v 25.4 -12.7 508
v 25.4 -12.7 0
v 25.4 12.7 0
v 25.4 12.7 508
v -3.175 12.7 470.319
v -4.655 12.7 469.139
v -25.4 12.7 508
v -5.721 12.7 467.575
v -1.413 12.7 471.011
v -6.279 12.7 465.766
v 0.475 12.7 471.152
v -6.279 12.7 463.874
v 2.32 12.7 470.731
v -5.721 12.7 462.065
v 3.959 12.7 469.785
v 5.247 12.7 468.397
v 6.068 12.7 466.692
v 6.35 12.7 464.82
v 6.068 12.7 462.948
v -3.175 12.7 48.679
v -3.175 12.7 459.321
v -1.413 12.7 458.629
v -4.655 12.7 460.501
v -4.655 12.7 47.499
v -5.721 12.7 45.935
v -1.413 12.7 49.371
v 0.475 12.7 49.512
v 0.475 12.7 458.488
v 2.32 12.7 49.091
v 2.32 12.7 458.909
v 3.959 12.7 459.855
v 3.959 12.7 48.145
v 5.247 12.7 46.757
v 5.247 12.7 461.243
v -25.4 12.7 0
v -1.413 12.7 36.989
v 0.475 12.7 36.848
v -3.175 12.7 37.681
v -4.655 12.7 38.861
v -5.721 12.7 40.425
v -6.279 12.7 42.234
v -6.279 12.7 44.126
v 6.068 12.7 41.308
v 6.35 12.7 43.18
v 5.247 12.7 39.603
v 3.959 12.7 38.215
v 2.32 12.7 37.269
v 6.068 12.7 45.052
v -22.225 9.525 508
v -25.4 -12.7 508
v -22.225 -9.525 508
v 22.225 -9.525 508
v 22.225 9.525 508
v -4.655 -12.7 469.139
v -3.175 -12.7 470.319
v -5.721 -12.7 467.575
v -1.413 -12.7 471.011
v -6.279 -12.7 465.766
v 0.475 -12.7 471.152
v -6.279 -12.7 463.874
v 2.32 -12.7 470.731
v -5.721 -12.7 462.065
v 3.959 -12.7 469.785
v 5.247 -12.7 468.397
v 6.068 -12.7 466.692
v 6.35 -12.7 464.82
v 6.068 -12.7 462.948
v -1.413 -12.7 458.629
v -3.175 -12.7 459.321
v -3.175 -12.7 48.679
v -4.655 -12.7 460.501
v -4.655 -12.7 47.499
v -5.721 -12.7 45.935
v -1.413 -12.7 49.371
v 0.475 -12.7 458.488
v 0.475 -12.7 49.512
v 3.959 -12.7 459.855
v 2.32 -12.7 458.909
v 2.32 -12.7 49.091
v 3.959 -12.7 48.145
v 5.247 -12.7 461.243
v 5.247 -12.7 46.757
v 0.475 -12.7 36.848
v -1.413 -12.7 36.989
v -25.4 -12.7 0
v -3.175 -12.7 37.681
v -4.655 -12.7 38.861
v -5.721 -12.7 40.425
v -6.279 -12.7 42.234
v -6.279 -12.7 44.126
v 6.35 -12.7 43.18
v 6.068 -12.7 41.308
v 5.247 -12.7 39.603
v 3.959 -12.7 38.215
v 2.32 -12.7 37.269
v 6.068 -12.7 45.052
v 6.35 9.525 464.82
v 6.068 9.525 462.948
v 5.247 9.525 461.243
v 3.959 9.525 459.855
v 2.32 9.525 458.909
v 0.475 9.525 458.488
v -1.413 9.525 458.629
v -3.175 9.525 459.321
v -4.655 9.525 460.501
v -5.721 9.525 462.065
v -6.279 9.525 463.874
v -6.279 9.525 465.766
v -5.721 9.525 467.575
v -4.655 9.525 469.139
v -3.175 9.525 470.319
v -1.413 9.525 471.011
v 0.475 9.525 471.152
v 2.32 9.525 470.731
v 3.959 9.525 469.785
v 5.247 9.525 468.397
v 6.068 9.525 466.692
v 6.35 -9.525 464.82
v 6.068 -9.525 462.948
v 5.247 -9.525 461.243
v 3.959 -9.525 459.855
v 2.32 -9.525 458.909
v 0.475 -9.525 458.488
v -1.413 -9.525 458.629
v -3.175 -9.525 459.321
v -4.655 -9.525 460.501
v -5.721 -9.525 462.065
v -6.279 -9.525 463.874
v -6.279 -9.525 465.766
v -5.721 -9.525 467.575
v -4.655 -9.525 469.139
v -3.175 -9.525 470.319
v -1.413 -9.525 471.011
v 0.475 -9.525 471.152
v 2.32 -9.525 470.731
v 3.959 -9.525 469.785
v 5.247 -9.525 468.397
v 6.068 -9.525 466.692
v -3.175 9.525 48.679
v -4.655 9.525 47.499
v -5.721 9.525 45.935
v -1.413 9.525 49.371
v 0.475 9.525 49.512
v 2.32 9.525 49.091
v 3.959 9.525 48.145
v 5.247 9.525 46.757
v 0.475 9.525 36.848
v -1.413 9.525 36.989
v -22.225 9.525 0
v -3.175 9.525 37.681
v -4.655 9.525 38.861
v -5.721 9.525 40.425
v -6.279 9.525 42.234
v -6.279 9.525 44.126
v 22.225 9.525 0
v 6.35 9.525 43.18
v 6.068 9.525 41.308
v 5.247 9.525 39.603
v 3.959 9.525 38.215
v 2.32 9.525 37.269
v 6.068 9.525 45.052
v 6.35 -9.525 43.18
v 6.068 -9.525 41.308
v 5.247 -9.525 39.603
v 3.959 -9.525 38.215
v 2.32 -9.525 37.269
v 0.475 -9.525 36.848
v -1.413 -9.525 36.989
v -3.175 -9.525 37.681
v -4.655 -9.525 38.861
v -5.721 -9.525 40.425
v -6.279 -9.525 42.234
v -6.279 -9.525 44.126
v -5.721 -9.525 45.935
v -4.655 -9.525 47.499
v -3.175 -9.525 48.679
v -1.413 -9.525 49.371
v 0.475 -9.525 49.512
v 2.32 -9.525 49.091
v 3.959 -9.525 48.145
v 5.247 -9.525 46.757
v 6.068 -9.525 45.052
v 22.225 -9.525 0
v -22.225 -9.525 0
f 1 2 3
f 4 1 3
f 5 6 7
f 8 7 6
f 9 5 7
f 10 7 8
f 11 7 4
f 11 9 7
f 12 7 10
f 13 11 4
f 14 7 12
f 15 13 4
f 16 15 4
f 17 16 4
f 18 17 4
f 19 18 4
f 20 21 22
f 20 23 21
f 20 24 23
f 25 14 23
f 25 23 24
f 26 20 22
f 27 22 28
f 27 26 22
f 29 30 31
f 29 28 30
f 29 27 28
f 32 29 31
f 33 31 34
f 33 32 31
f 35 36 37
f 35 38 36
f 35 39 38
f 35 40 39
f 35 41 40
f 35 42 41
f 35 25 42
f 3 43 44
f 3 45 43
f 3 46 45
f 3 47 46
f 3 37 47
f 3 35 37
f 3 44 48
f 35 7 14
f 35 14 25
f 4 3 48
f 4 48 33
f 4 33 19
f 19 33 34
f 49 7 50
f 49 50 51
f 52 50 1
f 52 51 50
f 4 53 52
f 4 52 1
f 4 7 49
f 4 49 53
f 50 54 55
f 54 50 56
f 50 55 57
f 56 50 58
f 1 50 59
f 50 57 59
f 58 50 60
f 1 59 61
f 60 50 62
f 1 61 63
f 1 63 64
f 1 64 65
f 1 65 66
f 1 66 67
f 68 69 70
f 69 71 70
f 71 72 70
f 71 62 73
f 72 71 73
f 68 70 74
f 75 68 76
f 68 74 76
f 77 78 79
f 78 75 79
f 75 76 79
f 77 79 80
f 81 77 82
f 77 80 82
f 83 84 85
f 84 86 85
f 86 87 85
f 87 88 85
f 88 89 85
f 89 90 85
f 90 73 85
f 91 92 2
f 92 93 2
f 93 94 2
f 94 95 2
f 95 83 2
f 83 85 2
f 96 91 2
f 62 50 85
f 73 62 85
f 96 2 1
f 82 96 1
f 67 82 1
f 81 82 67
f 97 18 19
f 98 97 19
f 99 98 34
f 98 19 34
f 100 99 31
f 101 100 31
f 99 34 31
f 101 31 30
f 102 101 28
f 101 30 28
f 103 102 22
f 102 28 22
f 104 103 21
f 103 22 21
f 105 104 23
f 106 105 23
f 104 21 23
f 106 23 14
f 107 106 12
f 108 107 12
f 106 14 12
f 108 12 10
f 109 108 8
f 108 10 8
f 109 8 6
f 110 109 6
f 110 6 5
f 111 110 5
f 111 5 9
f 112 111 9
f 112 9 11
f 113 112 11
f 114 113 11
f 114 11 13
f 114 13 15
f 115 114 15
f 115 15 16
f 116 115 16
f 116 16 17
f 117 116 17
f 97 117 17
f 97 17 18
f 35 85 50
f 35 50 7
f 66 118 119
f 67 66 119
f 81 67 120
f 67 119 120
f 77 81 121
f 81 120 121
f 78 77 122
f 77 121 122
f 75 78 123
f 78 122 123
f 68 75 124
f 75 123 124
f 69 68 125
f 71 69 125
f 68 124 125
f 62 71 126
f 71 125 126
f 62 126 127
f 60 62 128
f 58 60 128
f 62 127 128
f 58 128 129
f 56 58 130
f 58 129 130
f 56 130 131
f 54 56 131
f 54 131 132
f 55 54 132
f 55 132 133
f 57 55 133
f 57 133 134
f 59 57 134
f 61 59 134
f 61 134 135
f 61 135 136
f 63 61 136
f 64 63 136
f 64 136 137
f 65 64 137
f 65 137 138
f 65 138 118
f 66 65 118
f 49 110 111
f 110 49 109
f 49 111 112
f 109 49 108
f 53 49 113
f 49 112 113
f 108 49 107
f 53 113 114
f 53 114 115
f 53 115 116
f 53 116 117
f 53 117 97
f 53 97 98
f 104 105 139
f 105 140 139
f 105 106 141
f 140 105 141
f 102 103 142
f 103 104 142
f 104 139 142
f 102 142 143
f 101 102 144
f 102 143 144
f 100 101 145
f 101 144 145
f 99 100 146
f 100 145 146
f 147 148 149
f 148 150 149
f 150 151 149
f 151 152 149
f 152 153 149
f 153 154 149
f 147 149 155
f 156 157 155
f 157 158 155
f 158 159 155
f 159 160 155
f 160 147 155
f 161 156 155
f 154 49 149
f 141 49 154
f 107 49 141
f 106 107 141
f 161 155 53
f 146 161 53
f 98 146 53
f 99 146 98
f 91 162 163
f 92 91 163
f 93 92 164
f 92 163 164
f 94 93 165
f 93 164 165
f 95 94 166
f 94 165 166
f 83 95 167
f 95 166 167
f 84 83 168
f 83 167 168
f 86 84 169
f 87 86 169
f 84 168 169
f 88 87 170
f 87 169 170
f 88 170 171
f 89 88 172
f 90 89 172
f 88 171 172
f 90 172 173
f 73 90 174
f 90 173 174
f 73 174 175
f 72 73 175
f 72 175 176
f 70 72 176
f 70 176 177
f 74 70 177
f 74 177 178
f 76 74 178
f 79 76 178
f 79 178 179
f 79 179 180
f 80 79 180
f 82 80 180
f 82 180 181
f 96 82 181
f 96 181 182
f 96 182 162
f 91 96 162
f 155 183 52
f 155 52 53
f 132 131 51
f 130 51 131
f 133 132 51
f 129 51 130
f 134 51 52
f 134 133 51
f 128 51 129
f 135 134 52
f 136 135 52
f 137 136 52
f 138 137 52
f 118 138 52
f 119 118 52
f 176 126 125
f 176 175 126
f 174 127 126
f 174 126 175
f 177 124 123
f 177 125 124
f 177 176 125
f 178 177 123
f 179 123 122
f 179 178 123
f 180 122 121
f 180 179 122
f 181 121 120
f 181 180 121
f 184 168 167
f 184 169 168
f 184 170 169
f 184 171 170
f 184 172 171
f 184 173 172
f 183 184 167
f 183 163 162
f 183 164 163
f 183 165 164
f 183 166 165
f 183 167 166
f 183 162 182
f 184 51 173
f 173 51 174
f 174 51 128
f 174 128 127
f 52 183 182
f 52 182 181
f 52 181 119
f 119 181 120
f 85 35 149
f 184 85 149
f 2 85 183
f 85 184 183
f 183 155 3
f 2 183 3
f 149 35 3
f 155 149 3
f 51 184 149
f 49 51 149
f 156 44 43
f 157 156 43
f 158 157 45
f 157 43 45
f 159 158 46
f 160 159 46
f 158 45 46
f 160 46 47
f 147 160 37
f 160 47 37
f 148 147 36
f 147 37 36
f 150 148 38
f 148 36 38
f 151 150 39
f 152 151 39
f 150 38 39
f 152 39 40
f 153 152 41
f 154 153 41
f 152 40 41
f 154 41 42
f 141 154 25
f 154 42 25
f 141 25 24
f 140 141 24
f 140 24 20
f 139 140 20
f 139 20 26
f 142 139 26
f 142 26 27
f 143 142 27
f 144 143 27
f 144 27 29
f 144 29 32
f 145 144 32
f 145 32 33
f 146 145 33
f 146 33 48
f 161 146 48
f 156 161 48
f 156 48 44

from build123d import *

# Parameters (mm, degrees)
SKETCH1_W           = 50.8
SKETCH1_H           = 25.4
SKETCH1_W_2         = 44.45
SKETCH1_H_2         = 19.05
EXTRUDE_THIN1_DEPTH = 508
SKETCH2_R           = 6.35
CUT_EXTRUDE1_DEPTH  = 26.4


with BuildPart() as part:
    # Sketch1 → Extrude-Thin1 (new body)
    with BuildSketch(Plane.XY):
        Rectangle(SKETCH1_W, SKETCH1_H)
        Rectangle(SKETCH1_W_2, SKETCH1_H_2, mode=Mode.SUBTRACT)
    extrude(amount=EXTRUDE_THIN1_DEPTH)

    # Sketch2 → Cut-Extrude1 (cut, through all)
    with BuildSketch(Plane(origin=(0, 12.7, 0), x_dir=(1, 0, 0), z_dir=(0, 1, 0))):
        with Locations((0, -464.82)):
            Circle(SKETCH2_R)
        with Locations((0, -43.18)):
            Circle(SKETCH2_R)
    extrude(amount=-CUT_EXTRUDE1_DEPTH, mode=Mode.SUBTRACT)


solid = part.part
